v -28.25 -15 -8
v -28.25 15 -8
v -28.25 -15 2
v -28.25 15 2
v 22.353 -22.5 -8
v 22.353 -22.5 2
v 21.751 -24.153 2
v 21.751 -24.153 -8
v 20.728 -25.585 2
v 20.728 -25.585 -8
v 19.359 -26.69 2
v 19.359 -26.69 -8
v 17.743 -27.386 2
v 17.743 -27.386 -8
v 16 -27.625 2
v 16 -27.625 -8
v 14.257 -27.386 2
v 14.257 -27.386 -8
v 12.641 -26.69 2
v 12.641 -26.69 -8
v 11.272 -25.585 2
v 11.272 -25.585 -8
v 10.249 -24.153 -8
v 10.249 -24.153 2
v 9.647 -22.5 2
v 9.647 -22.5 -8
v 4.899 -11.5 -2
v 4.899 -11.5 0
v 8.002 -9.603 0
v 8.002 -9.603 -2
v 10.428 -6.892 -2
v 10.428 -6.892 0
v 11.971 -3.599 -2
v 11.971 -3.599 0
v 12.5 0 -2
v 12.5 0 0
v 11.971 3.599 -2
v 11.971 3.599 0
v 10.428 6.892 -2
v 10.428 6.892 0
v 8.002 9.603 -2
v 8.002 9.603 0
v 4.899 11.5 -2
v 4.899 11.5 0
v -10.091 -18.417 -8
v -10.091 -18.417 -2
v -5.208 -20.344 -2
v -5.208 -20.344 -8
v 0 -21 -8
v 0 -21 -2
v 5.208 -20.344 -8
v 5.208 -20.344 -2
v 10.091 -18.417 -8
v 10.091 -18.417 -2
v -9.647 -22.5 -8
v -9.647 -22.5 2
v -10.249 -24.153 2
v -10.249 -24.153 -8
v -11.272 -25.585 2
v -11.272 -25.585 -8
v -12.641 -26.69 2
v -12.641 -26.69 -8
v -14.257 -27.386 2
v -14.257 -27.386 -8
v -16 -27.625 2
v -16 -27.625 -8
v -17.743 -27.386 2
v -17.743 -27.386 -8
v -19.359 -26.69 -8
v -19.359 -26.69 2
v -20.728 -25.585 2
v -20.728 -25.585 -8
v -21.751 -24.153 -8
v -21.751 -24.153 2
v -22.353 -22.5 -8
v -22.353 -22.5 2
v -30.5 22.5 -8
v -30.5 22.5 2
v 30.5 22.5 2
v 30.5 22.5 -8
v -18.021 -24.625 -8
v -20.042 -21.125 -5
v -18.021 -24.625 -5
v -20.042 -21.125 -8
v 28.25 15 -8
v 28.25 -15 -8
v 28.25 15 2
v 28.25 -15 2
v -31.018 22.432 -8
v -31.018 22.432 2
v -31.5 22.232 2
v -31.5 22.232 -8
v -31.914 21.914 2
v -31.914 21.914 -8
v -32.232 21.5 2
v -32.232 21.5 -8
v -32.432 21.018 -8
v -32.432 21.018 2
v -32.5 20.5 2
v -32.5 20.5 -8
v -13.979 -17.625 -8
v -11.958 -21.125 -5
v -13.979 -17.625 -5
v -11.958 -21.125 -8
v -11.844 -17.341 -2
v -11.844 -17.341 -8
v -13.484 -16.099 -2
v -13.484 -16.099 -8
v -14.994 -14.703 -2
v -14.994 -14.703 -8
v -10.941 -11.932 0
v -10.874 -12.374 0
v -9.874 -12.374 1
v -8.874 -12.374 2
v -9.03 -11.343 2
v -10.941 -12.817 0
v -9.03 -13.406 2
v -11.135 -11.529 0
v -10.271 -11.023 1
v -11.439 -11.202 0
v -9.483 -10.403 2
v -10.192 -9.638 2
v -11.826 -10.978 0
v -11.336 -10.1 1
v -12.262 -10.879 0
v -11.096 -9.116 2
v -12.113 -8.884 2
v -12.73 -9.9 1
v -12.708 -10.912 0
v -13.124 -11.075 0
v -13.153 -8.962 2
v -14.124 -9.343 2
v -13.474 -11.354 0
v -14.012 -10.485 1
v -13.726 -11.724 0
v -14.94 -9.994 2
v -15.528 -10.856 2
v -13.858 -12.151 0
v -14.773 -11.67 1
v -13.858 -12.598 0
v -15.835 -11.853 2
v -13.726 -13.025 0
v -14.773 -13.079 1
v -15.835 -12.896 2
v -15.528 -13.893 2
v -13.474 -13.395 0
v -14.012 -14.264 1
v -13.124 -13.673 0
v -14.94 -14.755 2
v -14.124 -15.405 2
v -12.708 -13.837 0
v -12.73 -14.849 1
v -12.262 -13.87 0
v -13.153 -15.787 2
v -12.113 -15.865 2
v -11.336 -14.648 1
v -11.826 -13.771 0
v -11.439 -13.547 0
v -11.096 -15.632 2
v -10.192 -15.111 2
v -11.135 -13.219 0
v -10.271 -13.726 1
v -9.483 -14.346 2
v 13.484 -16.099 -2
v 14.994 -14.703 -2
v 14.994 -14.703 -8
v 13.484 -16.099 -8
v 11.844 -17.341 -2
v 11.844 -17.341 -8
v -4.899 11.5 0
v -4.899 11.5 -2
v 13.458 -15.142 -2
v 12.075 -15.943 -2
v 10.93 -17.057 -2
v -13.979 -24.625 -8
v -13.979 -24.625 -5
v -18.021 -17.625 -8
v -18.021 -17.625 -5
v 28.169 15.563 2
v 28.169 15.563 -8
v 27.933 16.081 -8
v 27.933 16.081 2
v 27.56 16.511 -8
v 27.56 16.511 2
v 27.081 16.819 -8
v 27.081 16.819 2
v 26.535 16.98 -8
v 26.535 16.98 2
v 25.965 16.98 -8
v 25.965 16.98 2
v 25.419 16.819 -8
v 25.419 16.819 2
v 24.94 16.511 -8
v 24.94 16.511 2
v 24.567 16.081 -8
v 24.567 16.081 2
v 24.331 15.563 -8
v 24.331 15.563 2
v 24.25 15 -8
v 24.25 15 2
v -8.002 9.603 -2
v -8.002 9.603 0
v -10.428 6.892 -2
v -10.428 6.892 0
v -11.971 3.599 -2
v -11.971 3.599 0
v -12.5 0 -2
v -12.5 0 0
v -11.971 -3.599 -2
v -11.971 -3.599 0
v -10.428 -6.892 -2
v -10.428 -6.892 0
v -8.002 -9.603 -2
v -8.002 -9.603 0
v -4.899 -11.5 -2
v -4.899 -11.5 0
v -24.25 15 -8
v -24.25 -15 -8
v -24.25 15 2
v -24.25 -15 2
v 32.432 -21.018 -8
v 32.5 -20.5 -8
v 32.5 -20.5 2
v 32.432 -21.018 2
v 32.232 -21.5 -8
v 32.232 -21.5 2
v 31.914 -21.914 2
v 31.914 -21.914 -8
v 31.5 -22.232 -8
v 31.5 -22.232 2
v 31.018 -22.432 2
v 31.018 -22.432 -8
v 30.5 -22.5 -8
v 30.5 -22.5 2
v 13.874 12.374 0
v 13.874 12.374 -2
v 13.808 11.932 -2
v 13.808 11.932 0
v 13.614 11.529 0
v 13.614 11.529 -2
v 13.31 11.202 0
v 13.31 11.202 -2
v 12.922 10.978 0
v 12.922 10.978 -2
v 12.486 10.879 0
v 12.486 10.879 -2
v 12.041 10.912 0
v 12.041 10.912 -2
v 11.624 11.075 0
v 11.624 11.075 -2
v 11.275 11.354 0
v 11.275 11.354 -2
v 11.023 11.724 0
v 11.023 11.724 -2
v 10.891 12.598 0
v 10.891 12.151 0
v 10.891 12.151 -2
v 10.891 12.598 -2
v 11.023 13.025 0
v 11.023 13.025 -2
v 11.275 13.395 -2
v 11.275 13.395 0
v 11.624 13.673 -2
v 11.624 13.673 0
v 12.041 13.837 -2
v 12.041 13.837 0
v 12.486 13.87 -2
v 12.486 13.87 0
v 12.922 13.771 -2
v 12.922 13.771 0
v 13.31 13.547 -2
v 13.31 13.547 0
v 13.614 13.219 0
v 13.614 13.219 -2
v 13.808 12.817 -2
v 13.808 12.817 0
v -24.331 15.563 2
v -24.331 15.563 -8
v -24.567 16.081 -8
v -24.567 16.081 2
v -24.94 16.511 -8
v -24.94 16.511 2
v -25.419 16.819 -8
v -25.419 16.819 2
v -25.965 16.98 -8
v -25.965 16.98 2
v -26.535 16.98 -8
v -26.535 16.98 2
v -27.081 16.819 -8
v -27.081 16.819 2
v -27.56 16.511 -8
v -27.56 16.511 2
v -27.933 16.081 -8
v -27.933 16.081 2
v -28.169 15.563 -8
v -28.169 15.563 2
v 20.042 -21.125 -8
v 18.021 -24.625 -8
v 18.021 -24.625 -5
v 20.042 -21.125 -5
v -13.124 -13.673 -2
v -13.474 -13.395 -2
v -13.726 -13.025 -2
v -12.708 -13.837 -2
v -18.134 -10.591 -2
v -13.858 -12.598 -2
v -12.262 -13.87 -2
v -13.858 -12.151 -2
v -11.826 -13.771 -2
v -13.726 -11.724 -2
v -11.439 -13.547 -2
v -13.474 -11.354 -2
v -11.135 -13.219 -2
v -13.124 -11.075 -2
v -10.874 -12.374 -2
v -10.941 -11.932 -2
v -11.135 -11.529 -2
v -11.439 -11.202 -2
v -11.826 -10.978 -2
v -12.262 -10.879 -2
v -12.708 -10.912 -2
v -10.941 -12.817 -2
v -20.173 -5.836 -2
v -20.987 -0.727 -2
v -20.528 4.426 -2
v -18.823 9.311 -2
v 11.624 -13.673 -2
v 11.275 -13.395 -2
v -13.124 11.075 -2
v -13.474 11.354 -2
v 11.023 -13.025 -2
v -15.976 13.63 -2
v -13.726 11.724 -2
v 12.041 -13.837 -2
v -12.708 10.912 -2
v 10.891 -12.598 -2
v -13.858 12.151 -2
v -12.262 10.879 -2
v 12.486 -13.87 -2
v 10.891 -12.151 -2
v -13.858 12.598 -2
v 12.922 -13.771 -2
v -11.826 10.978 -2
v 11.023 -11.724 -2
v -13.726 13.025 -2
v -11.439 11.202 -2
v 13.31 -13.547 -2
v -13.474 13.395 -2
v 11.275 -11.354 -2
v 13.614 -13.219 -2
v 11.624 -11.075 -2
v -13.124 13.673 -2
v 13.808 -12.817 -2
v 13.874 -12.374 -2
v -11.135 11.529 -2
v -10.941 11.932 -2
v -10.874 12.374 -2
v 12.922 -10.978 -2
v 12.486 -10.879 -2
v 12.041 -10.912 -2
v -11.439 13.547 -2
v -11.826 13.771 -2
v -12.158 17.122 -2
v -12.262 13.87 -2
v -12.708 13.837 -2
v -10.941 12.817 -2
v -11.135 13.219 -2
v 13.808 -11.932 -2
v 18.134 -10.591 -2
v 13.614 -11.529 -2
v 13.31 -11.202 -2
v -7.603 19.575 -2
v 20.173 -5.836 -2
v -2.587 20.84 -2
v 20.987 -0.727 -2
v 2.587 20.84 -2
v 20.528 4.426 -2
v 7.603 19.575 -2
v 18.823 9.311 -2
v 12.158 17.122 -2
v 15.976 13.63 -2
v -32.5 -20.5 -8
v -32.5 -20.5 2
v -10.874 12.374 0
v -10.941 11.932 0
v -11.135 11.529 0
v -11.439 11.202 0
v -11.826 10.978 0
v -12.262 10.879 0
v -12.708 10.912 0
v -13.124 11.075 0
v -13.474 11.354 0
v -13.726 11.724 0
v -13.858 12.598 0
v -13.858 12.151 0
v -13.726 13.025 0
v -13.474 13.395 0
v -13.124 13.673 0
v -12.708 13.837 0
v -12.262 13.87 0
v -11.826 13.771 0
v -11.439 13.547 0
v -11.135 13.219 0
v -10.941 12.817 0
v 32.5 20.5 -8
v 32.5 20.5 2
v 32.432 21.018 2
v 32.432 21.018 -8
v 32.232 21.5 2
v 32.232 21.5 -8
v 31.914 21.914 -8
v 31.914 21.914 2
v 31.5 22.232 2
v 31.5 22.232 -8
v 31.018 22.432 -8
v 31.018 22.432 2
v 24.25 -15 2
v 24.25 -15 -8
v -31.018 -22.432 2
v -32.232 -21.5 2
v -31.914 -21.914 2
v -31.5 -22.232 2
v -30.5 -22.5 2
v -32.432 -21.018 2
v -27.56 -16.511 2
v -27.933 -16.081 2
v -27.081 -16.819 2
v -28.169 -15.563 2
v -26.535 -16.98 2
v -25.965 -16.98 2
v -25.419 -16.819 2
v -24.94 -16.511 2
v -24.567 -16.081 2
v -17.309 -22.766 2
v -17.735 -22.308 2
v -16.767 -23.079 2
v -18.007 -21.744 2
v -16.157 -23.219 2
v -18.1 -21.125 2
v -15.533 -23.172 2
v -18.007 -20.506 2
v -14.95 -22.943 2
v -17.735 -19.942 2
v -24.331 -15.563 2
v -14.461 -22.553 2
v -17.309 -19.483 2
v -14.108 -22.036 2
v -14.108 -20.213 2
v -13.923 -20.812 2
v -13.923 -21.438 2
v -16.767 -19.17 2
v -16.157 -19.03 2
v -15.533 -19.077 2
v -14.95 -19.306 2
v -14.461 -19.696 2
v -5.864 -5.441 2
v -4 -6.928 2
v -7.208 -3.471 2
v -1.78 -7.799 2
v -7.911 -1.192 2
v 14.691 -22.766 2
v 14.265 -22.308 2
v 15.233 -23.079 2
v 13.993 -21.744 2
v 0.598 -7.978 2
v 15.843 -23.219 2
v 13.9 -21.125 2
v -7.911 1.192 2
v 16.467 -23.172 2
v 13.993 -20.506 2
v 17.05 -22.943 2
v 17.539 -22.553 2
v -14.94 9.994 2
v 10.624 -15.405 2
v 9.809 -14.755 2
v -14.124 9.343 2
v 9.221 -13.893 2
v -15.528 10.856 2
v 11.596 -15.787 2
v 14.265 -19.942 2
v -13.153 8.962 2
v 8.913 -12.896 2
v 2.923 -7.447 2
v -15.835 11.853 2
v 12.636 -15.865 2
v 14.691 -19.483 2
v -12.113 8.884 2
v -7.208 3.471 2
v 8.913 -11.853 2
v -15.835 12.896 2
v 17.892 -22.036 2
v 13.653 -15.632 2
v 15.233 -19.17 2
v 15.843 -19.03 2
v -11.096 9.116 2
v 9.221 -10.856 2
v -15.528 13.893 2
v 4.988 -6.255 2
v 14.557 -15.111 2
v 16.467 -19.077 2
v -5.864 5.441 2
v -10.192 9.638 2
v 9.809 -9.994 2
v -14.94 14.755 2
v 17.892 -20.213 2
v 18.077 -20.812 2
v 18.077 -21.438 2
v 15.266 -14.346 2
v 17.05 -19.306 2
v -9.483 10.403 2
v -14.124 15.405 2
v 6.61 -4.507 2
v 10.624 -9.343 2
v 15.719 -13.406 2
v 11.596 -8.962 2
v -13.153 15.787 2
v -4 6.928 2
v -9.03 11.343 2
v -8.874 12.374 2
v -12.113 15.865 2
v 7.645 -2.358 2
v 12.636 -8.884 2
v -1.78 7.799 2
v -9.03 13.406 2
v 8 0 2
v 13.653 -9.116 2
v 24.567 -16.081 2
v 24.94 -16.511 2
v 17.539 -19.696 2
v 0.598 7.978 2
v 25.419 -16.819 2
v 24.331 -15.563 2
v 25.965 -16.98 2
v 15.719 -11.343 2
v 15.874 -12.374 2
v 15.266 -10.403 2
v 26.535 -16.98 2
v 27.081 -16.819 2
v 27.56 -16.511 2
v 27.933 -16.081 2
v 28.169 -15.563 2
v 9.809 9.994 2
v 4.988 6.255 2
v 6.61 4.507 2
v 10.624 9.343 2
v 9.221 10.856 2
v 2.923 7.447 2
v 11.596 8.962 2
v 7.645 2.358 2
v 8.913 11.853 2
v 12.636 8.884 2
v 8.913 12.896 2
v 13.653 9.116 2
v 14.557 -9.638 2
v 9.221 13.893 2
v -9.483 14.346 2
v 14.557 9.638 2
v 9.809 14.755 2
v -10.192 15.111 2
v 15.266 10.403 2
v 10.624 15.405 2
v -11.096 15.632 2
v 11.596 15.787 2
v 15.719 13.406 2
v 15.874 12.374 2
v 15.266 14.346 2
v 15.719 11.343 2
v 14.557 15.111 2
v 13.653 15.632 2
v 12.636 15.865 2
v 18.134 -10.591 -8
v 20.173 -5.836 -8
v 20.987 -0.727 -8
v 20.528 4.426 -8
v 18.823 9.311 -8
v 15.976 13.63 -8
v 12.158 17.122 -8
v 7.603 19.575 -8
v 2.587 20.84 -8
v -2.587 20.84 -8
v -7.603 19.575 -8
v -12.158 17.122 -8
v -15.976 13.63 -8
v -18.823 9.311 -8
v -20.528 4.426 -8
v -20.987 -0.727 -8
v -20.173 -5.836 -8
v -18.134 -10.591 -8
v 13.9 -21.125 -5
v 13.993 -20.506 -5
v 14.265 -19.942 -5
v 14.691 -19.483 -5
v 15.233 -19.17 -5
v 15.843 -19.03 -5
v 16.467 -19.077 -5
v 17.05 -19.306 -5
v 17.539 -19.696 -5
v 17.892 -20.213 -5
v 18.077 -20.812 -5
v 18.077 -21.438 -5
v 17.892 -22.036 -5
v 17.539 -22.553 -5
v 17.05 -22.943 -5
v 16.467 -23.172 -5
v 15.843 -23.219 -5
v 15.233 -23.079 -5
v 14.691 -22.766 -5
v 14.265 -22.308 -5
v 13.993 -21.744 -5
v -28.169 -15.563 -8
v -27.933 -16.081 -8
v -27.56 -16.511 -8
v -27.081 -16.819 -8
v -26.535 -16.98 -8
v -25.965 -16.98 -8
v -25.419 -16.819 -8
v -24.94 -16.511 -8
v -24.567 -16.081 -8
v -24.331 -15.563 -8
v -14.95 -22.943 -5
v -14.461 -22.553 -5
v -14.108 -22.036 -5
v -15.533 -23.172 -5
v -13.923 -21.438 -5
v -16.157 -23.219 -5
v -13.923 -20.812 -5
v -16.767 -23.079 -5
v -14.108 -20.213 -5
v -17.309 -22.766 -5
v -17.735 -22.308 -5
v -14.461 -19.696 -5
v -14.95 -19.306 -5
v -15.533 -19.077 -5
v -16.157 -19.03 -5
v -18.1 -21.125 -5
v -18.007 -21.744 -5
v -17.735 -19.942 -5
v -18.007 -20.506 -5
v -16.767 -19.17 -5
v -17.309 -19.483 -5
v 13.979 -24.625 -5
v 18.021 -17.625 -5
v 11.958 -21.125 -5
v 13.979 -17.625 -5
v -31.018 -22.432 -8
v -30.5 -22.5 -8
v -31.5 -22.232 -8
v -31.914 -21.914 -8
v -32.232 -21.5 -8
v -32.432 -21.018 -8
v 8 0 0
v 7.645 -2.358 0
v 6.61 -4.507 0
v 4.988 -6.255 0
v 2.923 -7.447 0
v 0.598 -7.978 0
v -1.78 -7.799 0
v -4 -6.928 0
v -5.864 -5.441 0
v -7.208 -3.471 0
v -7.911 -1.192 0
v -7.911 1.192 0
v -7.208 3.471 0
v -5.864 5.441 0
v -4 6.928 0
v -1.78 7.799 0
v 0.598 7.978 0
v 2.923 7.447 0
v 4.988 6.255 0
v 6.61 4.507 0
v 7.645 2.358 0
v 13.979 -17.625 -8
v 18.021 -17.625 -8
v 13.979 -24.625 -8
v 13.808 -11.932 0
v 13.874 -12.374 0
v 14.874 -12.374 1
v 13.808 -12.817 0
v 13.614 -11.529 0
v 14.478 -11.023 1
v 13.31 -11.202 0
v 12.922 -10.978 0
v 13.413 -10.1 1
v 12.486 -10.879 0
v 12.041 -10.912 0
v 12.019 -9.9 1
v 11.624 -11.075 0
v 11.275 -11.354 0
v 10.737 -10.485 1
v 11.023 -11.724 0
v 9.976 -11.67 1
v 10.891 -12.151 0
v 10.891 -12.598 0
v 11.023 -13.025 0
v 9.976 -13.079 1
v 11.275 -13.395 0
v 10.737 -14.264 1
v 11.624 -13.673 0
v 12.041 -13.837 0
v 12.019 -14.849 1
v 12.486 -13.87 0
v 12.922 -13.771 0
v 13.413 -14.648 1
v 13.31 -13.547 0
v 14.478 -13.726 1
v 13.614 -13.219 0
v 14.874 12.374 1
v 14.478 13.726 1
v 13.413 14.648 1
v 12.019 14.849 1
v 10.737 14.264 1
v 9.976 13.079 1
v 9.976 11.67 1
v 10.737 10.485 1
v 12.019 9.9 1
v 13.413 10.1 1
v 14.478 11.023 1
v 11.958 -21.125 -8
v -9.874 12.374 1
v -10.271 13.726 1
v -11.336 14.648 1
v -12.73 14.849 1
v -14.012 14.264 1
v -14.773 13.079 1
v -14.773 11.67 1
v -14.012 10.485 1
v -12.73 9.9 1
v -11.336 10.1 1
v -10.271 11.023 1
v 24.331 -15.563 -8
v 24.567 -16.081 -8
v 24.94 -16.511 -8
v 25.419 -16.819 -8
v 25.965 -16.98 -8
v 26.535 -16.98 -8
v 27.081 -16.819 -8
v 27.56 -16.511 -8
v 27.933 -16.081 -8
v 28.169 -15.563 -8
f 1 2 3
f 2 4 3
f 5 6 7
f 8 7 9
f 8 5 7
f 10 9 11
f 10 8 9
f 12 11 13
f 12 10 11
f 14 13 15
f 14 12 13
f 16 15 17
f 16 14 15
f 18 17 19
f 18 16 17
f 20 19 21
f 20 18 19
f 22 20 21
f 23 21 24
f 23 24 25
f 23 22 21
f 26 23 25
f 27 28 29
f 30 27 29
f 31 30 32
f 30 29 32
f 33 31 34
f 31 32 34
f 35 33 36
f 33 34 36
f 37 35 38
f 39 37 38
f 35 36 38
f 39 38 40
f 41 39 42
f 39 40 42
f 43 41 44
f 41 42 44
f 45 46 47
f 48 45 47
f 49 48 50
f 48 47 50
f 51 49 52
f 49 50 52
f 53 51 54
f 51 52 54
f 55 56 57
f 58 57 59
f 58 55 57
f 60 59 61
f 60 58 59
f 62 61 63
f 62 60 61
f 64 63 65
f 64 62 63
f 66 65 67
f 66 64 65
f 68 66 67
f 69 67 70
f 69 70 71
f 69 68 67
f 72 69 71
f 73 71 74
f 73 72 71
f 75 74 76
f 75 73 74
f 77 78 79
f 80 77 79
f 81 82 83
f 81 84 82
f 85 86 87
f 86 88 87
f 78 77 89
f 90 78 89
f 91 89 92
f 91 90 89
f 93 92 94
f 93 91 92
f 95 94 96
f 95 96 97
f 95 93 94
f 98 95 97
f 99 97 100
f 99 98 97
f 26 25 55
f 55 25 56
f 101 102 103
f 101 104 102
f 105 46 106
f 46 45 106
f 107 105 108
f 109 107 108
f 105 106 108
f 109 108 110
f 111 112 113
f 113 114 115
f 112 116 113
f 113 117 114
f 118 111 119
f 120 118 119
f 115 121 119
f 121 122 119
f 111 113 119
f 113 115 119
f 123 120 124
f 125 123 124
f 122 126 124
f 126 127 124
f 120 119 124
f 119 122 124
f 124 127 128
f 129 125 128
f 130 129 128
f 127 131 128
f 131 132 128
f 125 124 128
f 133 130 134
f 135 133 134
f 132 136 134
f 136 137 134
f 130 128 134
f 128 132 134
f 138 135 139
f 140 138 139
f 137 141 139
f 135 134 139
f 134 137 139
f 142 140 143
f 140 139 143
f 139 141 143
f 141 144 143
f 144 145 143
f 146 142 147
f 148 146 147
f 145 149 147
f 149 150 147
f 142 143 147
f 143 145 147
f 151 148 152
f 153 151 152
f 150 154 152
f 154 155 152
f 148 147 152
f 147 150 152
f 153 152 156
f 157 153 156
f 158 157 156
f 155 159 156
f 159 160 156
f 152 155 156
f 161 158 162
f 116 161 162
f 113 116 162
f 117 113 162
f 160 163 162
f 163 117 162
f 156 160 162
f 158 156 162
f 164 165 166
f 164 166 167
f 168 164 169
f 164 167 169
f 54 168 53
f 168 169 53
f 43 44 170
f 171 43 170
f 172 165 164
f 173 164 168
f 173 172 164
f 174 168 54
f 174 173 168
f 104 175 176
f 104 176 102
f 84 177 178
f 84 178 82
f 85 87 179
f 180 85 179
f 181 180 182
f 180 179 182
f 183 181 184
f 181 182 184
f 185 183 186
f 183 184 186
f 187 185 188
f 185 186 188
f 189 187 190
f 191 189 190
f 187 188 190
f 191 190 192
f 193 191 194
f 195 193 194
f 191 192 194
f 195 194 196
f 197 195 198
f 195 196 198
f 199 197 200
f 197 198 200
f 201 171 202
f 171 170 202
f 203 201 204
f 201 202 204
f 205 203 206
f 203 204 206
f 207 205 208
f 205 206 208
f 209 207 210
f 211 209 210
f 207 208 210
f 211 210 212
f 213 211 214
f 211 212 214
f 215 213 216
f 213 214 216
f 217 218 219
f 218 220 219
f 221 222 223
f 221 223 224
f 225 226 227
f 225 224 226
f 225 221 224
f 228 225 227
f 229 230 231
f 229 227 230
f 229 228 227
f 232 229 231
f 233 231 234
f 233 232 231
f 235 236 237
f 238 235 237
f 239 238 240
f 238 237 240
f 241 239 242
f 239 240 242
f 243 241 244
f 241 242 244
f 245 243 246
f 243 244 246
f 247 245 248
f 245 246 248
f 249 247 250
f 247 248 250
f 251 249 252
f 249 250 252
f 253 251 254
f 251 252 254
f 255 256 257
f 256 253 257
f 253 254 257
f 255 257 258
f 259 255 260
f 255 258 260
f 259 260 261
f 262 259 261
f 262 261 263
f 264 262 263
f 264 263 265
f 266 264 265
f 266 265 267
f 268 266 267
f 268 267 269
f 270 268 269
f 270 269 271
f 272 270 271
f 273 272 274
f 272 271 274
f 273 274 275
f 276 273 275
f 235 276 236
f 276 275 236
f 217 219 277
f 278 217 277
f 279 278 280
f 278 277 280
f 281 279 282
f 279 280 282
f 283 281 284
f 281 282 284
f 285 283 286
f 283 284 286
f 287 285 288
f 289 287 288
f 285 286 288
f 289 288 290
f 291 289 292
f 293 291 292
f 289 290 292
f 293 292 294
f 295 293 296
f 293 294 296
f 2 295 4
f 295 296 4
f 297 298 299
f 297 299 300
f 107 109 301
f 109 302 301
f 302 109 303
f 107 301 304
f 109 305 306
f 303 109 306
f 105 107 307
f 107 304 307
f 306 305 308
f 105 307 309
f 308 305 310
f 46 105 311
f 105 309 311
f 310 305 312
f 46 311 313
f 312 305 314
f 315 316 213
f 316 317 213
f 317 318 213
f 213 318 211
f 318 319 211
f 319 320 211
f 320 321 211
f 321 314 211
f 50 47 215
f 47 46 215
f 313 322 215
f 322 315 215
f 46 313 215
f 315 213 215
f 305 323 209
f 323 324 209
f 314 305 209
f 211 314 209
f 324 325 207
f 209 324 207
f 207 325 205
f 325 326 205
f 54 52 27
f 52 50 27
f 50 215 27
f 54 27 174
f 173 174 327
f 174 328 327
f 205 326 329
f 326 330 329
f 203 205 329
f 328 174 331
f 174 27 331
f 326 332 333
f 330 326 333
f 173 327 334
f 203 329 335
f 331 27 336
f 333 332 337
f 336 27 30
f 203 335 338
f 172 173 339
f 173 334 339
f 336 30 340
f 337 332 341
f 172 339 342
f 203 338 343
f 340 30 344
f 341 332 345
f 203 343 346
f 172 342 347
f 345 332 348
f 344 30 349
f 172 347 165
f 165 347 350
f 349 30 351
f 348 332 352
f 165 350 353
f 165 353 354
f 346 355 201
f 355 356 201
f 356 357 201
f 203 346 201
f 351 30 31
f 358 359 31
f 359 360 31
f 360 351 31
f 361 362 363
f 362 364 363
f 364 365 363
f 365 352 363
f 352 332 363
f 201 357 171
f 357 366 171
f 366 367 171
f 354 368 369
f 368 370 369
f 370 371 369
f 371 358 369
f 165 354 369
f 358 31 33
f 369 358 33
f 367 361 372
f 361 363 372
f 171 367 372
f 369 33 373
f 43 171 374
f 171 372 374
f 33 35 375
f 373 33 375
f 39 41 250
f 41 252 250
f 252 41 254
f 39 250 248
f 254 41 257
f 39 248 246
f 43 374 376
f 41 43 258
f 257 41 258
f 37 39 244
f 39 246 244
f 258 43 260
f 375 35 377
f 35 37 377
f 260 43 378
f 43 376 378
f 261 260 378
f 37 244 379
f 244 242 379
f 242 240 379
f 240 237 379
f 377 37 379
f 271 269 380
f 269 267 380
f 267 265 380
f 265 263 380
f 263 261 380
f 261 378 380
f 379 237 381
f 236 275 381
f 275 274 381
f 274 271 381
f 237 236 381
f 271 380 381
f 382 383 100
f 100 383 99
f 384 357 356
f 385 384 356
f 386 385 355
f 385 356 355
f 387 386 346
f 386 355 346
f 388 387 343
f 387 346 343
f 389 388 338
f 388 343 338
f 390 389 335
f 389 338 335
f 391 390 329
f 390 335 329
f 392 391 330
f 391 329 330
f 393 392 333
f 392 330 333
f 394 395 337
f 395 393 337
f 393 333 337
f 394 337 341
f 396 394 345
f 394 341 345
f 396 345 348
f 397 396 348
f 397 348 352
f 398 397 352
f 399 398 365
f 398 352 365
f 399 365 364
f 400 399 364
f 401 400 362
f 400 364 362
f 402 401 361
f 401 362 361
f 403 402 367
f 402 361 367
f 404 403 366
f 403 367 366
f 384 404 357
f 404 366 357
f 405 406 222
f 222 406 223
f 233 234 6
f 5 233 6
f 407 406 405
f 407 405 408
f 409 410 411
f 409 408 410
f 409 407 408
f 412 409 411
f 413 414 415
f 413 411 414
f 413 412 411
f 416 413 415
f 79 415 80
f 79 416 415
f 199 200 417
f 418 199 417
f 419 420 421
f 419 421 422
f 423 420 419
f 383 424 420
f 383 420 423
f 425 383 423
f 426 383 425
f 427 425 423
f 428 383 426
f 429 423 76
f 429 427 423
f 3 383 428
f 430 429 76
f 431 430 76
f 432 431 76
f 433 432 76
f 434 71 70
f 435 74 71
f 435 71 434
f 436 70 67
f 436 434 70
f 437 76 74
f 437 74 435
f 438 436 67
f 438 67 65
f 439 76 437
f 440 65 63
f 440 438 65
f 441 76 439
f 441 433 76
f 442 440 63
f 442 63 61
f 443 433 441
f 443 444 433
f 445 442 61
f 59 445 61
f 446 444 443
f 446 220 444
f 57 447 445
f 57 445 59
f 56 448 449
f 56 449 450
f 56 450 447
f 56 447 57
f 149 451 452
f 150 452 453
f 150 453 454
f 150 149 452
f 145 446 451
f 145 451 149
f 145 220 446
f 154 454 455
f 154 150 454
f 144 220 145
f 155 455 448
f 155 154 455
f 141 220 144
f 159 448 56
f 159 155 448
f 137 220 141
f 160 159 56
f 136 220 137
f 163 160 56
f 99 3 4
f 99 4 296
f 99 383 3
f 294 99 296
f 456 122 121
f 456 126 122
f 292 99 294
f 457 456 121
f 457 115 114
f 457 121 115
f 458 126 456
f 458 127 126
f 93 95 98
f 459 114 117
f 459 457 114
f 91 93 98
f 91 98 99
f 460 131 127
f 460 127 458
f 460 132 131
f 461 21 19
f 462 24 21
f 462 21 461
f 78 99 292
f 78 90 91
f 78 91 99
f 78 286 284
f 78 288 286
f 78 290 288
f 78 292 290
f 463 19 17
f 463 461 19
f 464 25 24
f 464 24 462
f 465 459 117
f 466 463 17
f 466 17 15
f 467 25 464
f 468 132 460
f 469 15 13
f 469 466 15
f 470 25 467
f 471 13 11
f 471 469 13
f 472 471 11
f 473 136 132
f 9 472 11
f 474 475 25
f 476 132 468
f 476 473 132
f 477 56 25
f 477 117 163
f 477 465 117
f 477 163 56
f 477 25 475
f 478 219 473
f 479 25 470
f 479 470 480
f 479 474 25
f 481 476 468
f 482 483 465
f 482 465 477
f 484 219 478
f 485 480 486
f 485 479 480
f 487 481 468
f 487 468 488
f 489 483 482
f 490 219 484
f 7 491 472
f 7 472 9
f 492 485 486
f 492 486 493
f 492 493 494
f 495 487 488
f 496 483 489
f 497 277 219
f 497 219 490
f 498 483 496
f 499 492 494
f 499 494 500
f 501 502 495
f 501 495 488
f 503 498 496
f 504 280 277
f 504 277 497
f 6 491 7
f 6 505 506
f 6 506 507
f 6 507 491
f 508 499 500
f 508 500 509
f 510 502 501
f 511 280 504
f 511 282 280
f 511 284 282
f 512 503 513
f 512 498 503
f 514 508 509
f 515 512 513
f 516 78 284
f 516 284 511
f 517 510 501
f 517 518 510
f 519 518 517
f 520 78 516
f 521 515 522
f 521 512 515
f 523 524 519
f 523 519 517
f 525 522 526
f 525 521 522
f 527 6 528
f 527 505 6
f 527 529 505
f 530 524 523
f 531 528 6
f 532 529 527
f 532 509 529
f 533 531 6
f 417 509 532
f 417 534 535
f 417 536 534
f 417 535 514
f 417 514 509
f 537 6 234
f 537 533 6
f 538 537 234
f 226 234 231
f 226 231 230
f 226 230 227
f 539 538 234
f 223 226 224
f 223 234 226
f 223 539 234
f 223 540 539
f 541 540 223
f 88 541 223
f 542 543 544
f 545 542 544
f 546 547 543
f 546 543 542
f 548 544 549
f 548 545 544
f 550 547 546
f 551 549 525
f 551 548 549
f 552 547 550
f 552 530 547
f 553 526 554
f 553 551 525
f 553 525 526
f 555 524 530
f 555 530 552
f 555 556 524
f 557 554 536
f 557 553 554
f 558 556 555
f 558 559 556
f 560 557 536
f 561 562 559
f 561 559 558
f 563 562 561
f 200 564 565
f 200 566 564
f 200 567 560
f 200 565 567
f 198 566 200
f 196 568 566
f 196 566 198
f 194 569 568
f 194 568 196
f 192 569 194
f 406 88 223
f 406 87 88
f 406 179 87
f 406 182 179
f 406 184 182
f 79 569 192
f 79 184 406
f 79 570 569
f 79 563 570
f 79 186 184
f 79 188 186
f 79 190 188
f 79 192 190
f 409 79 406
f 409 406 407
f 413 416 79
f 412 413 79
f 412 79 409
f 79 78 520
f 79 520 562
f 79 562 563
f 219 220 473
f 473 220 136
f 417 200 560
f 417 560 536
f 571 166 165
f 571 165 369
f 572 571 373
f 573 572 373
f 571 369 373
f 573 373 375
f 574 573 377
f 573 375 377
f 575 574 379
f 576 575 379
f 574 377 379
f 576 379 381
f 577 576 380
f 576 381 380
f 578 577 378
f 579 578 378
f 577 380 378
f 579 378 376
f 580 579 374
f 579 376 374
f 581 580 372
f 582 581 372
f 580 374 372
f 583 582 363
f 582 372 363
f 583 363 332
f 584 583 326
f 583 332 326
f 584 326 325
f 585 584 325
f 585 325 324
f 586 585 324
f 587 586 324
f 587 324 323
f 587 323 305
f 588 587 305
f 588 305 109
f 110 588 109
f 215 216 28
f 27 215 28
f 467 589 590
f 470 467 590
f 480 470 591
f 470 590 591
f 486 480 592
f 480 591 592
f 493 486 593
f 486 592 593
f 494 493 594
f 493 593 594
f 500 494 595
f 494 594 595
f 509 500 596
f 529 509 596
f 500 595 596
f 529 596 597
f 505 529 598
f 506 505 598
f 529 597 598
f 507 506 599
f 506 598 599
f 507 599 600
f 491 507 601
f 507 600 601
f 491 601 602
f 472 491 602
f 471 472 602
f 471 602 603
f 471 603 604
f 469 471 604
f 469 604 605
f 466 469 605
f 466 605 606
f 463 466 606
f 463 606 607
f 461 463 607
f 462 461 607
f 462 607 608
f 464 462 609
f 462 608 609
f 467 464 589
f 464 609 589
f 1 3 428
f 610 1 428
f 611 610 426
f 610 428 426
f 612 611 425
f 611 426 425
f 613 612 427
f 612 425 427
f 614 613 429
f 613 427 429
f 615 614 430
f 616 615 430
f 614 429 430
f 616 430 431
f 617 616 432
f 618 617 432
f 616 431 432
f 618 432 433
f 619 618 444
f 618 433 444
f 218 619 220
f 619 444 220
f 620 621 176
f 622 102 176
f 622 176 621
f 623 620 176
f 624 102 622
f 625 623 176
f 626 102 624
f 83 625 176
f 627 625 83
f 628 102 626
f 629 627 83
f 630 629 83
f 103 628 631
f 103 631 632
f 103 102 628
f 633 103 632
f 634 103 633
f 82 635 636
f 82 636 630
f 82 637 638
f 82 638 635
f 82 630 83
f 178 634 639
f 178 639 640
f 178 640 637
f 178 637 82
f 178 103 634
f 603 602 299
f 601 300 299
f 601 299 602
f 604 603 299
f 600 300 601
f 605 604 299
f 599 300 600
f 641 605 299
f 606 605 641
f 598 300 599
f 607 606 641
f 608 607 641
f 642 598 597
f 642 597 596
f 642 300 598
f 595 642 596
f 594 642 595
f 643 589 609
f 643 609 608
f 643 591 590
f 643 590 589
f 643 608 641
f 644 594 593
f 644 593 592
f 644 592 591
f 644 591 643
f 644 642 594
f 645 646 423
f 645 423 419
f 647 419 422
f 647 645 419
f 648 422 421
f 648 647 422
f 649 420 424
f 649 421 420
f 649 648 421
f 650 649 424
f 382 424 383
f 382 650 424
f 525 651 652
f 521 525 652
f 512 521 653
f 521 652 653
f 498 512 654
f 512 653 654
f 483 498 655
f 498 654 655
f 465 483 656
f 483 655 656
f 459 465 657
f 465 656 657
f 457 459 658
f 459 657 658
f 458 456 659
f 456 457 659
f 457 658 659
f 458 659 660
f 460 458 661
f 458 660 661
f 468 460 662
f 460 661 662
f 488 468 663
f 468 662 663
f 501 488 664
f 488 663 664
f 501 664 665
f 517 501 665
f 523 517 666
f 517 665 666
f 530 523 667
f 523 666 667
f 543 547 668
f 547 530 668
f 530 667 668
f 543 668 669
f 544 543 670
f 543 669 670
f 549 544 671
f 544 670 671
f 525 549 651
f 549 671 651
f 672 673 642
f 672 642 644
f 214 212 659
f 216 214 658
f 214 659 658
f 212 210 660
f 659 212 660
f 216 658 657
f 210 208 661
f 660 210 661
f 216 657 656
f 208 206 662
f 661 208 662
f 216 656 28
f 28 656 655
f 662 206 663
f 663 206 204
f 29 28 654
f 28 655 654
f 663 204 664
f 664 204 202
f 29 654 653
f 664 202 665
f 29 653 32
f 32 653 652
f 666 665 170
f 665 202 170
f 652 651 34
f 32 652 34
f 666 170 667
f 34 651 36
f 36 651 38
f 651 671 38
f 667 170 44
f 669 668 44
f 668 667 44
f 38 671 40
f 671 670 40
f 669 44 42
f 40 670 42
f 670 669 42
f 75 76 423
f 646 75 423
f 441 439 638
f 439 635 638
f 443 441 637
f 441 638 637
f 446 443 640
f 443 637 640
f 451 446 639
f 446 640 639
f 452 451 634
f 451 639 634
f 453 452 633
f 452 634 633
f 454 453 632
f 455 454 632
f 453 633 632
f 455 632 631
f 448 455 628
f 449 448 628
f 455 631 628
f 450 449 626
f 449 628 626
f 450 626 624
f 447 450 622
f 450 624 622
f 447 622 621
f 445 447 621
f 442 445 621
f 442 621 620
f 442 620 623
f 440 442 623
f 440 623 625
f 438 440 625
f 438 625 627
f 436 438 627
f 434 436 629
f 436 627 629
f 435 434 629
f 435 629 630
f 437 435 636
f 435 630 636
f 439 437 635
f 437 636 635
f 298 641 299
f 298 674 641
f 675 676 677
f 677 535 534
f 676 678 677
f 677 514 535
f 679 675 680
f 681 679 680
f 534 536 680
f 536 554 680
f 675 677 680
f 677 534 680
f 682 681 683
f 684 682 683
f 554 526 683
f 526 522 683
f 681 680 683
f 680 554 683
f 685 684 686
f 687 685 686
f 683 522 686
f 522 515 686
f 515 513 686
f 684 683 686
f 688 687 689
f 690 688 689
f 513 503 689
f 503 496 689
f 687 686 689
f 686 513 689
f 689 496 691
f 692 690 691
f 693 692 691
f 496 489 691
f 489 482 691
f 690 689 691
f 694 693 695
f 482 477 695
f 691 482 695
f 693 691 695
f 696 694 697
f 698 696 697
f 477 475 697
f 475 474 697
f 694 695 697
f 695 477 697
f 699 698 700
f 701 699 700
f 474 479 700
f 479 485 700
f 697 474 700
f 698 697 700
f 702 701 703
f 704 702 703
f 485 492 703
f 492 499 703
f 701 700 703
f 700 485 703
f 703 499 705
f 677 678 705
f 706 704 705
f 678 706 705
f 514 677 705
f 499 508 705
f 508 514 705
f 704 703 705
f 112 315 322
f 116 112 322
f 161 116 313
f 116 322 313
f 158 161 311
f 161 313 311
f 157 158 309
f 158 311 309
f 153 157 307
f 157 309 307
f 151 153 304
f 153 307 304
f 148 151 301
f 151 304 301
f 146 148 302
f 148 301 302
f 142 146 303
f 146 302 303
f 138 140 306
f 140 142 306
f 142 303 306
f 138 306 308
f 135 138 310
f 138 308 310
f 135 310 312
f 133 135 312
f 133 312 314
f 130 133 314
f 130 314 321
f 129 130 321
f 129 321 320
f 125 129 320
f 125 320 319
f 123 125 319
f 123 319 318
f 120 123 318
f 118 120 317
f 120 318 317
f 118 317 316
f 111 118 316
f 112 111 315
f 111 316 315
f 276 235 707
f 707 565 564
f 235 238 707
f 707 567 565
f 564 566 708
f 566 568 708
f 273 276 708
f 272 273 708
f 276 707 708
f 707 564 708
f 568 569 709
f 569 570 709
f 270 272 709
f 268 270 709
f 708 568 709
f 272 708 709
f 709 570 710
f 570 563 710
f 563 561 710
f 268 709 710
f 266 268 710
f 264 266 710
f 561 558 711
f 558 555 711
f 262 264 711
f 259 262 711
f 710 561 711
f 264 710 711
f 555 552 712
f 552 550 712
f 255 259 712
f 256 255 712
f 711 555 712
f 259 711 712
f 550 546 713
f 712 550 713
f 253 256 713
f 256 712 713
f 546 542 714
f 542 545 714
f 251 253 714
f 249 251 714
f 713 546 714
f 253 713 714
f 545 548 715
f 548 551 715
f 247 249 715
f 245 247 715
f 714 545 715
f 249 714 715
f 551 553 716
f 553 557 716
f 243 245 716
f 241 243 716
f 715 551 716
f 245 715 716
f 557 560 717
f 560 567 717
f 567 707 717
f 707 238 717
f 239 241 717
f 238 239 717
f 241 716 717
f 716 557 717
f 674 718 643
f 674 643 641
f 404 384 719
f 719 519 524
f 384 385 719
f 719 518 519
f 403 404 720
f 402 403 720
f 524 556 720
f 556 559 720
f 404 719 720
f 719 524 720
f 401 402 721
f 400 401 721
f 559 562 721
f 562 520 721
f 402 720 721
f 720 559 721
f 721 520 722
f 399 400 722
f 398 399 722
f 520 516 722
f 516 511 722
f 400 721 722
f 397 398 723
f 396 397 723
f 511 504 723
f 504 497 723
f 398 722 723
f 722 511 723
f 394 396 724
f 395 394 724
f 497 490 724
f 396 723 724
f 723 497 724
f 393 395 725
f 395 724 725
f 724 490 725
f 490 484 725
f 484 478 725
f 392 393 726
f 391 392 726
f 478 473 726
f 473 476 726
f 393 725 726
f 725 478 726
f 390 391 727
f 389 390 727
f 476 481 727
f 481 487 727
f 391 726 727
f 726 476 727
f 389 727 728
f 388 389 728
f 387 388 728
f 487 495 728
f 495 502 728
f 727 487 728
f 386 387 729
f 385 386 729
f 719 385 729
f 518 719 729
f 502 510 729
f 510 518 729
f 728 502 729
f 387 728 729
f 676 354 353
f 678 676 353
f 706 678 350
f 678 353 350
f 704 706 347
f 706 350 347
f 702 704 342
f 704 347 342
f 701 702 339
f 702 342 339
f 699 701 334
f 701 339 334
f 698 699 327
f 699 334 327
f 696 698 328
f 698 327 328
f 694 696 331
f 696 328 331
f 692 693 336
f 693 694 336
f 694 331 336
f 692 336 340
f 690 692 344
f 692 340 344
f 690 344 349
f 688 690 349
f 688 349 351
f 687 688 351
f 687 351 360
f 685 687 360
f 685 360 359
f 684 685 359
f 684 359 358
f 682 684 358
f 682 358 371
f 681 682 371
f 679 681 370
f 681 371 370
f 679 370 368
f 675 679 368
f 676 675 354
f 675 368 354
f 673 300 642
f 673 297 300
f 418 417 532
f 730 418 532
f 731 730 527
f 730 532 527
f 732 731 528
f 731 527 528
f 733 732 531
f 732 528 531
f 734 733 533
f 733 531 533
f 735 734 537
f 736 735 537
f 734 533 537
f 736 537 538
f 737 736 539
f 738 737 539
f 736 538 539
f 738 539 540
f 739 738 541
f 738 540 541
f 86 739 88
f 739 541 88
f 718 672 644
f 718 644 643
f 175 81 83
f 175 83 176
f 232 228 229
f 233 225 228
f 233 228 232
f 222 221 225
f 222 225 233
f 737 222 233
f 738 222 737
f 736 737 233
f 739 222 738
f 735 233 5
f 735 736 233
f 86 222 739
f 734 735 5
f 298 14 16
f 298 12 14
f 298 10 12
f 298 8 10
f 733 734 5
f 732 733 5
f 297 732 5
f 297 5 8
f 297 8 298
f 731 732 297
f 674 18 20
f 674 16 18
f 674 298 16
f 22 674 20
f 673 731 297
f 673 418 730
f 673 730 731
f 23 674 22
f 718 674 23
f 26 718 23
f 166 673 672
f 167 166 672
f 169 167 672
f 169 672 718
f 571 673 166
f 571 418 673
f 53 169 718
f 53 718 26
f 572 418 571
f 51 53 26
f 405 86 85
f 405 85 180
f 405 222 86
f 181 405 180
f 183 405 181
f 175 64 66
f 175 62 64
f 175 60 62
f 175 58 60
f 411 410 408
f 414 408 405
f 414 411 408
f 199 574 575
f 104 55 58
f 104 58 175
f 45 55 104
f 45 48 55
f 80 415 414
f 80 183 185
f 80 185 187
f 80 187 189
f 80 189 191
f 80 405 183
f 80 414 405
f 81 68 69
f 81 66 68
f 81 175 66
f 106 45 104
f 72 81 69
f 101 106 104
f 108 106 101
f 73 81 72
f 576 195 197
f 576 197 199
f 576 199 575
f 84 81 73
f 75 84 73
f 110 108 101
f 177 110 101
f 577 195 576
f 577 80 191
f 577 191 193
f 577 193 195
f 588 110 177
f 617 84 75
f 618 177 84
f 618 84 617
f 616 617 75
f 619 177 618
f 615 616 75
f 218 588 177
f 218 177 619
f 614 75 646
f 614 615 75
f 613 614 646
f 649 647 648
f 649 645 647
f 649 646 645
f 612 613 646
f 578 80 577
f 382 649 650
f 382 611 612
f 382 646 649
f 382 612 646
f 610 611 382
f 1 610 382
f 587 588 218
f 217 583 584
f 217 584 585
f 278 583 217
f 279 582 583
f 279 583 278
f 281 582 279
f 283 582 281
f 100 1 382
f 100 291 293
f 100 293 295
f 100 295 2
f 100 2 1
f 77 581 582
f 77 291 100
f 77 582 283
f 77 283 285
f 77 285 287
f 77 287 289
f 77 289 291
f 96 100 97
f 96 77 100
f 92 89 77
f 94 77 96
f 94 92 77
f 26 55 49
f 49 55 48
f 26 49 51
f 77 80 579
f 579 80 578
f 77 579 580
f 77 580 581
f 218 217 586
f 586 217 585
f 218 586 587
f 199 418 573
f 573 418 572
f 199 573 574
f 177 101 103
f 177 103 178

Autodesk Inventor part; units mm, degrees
ref_plane "YZ Plane" through (0, 0, 0) normal (1, 0, 0) x (0, 1, 0)
ref_plane "XZ Plane" through (0, 0, 0) normal (0, 1, 0) x (-1, 0, 0)
ref_plane "XY Plane" through (0, 0, 0) normal (0, 0, 1) x (1, 0, 0)
sketch "Skizze1" plane through (0, 0, 0) normal (0, 0, 1) x (1, 0, 0)
  circle A0 centre (0, 0) radius 4.5 projected
  line L0 (4.899, 11.5) -> (-4.899, 11.5) projected
  arc A1 (-4.899, 11.5) -> (-4.899, -11.5) centre (0, 0) ccw projected
  line L1 (-4.899, -11.5) -> (4.899, -11.5) projected
  arc A2 (4.899, -11.5) -> (4.899, 11.5) centre (0, 0) ccw projected
  arc A3 (4.899, -11.5) -> (4.899, 11.5) centre (0, 0) ccw projected
  arc A4 (-4.899, 11.5) -> (-4.899, -11.5) centre (0, 0) ccw projected
  line L2 (-4.899, -11.5) -> (4.899, -11.5) projected
  line L3 (4.899, 11.5) -> (-4.899, 11.5) projected
  circle A5 centre (0, 0) radius 21 projected
  arc A6 (-21.082, -16.7467) -> (-16.7467, -21.082) centre (0, 0) ccw projected
  line L4 (-16.7467, -21.082) -> (16.7467, -21.082) projected
  arc A7 (16.7467, -21.082) -> (21.082, -16.7467) centre (0, 0) ccw projected
  line L5 (21.082, -16.7467) -> (21.082, 16.7467) projected
  arc A8 (21.082, 16.7467) -> (16.7467, 21.082) centre (0, 0) ccw projected
  line L6 (16.7467, 21.082) -> (-16.7467, 21.082) projected
  arc A9 (-16.7467, 21.082) -> (-21.082, 16.7467) centre (0, 0) ccw projected
  line L7 (-21.082, 16.7467) -> (-21.082, -16.7467) projected
  line L8 (-32.5, -22.5) -> (32.5, -22.5)
  line L9 (32.5, -22.5) -> (32.5, 22.5)
  line L10 (32.5, 22.5) -> (-32.5, 22.5)
  line L11 (-32.5, 22.5) -> (-32.5, -22.5)
  line L12 (-32.5, -22.5) -> (32.5, 22.5) construction
  line L13 (32.5, -22.5) -> (-32.5, 22.5) construction
  arc A10 (-14.4273, -15.2596) -> (14.4273, -15.2596) centre (0, 0) ccw projected
  arc A11 (15.2596, 14.4273) -> (14.4273, 15.2596) centre (15.494, 15.494) ccw projected
  arc A12 (14.4273, -15.2596) -> (15.2596, -14.4273) centre (15.494, -15.494) ccw projected
  arc A13 (-15.2596, -14.4273) -> (-14.4273, -15.2596) centre (-15.494, -15.494) ccw projected
  arc A14 (-14.4273, 15.2596) -> (-15.2596, 14.4273) centre (-15.494, 15.494) ccw projected
  arc A15 (-15.2596, 14.4273) -> (-15.2596, -14.4273) centre (0, 0) ccw projected
  arc A16 (14.4273, 15.2596) -> (-14.4273, 15.2596) centre (0, 0) ccw projected
  arc A17 (15.2596, -14.4273) -> (15.2596, 14.4273) centre (0, 0) ccw projected
  circle A18 centre (12.3744, -12.3744) radius 1.5 projected
  circle A19 centre (12.3744, -12.3744) radius 1.5 projected
  circle A20 centre (-12.3744, -12.3744) radius 1.5 projected
  circle A21 centre (-12.3744, -12.3744) radius 1.5 projected
  circle A22 centre (-12.3744, 12.3744) radius 1.5 projected
  circle A23 centre (-12.3744, 12.3744) radius 1.5 projected
  circle A24 centre (12.3744, 12.3744) radius 1.5 projected
  circle A25 centre (12.3744, 12.3744) radius 1.5 projected
  point P0 (0, 0)
  point P1 (8.8388, 8.8388)
  point P2 (8.8388, -8.8388)
  point P3 (-8.8388, -8.8388)
  point P4 (-8.8388, 8.8388)
  dimension "d0" = 45
  dimension "d1" = 65
extrude "Extrusion1" add sketch "Skizze1" against normal blind 2 contours A5 | A5 A11 | A12 A5 | A5 A14 | A13 A5 | L7 A9 L6 A8 L5 A7 L4 A6 | L11 L10 L9 L8
sketch "Skizze2" plane through (0, 0, 0) normal (0, 0, 1) x (1, 0, 0)
  circle A0 centre (0, 0) radius 8
  arc A1 (-4.899, 11.5) -> (-4.899, -11.5) centre (0, 0) ccw projected
  line L0 (-4.899, 11.5) -> (4.899, 11.5) projected
  arc A2 (4.899, -11.5) -> (4.899, 11.5) centre (0, 0) ccw projected
  line L1 (4.899, -11.5) -> (-4.899, -11.5) projected
  circle A3 centre (12.3744, 12.3744) radius 1.5 projected
  circle A4 centre (-12.3744, 12.3744) radius 1.5 projected
  circle A5 centre (-12.3744, -12.3744) radius 1.5 projected
  circle A6 centre (12.3744, -12.3744) radius 1.5 projected
  line L2 (-32.5, -22.5) -> (32.5, -22.5) projected
  line L3 (32.5, -22.5) -> (32.5, 22.5) projected
  line L4 (32.5, 22.5) -> (-32.5, 22.5) projected
  line L5 (-32.5, 22.5) -> (-32.5, -22.5) projected
  dimension "d31" = 16
extrude "Extrusion2" add sketch "Skizze2" along normal blind 2 contours L0 A2 L1 A1 | L5 L4 L3 L2
sketch "Skizze3" plane through (0, 0, -2) normal (0, 0, -1) x (-1, 0, 0)
  circle A0 centre (0, 0) radius 21 projected
  line L0 (-32.5, -22.5) -> (32.5, -22.5) projected
  line L1 (32.5, -22.5) -> (32.5, 22.5) projected
  line L2 (32.5, 22.5) -> (-32.5, 22.5) projected
  line L3 (-32.5, 22.5) -> (-32.5, -22.5) projected
  arc A1 (4.899, -11.5) -> (4.899, 11.5) centre (0, 0) ccw projected
  line L4 (-4.899, 11.5) -> (4.899, 11.5) projected
  line L5 (4.899, -11.5) -> (-4.899, -11.5) projected
  arc A2 (-4.899, 11.5) -> (-4.899, -11.5) centre (0, 0) ccw projected
  point P0 (0, 0)
extrude "Extrusion3" add sketch "Skizze3" along normal blind 6 contours L3 L2 L1 L0
sketch "Skizze4" plane through (0, 0, 2) normal (0, 0, 1) x (1, 0, 0)
  circle A0 centre (0, 0) radius 8 projected
  line L0 (-26.25, -15) -> (-26.25, 15) construction
  line L1 (-24.25, -15) -> (-24.25, 15)
  line L2 (-28.25, 15) -> (-28.25, -15)
  arc A1 (-28.25, -15) -> (-24.25, -15) centre (-26.25, -15) ccw
  arc A2 (-24.25, 15) -> (-28.25, 15) centre (-26.25, 15) ccw
  line L3 (26.25, -15) -> (26.25, 15) construction
  line L4 (28.25, -15) -> (28.25, 15)
  line L5 (24.25, 15) -> (24.25, -15)
  arc A3 (24.25, -15) -> (28.25, -15) centre (26.25, -15) ccw
  arc A4 (28.25, 15) -> (24.25, 15) centre (26.25, 15) ccw
  line L6 (-26.25, 0) -> (26.25, 0) construction
  dimension "d10" = 4
  dimension "d11" = 30
  dimension "d32" = 52.5
extrude "Extrusion4" cut sketch "Skizze4" against normal through all contours A1 L2 A2 L1 | A3 L5 A4 L4
sketch "Skizze5" plane through (0, 0, -8) normal (0, 0, -1) x (-1, 0, 0)
  circle A0 centre (0, 0) radius 20
  circle A1 centre (-16, -21.1246) radius 6.5
  circle A2 centre (16, -21.1246) radius 6.5
  circle A3 centre (0, 0) radius 21 projected
  line L0 (-32.5, -22.5) -> (32.5, -22.5) projected
  line L1 (32.5, -22.5) -> (32.5, 22.5) projected
  line L2 (32.5, 22.5) -> (-32.5, 22.5) projected
  line L3 (-32.5, 22.5) -> (-32.5, -22.5) projected
  line L4 (-16, -21.1246) -> (16, -21.1246) construction
  line L5 (0, 0) -> (0, -21.1246) construction
  circle A4 centre (-16, -21.1246) radius 2.1
  circle A5 centre (16, -21.1246) radius 2.1
  dimension "d14" = 40
  dimension "d15" = 13
  dimension "d16" = 13
  dimension "d17" = 32
  dimension "d18" = 4.2
  dimension "d19" = 4.2
extrude "Extrusion5" add sketch "Skizze5" against normal up to surface (10 mm away) contours A1 A3 | A2 A3 | A1 L0 A4 A3 | A2 L0 A5 A3 | L0 A4 A1 | L0 A5 A2
extrude "Extrusion6" cut sketch "Skizze5" against normal through all contours A4 L0 | L0 A4 | A5 L0 | L0 A5
sketch "Skizze6" plane through (0, 0, -8) normal (0, 0, -1) x (-1, 0, 0)
  circle A0 centre (-16, -21.1246) radius 2.1 projected
  circle A1 centre (16, -21.1246) radius 2.1 projected
  line L0 (22.3528, -22.5) -> (32.5, -22.5) projected
  line L1 (32.5, -22.5) -> (32.5, 22.5) projected
  line L2 (32.5, 22.5) -> (-32.5, 22.5) projected
  line L3 (-32.5, 22.5) -> (-32.5, -22.5) projected
  arc A2 (-10.091, -18.4166) -> (10.091, -18.4166) centre (0, 0) ccw projected
  line L4 (-20.0415, -21.1246) -> (-18.0207, -17.6246)
  line L5 (-18.0207, -17.6246) -> (-13.9793, -17.6246)
  line L6 (-13.9793, -17.6246) -> (-11.9585, -21.1246)
  line L7 (-11.9585, -21.1246) -> (-13.9793, -24.6246)
  line L8 (-13.9793, -24.6246) -> (-18.0207, -24.6246)
  line L9 (-18.0207, -24.6246) -> (-20.0415, -21.1246)
  line L10 (20.0415, -21.1246) -> (18.0207, -24.6246)
  line L11 (18.0207, -24.6246) -> (13.9793, -24.6246)
  line L12 (13.9793, -24.6246) -> (11.9585, -21.1246)
  line L13 (11.9585, -21.1246) -> (13.9793, -17.6246)
  line L14 (13.9793, -17.6246) -> (18.0207, -17.6246)
  line L15 (18.0207, -17.6246) -> (20.0415, -21.1246)
  line L16 (-32.5, -22.5) -> (32.5, -22.5) projected
  line L17 (-32.5, -22.5) -> (32.5, -22.5) projected
  arc A3 (-10.091, -18.4166) -> (-14.9941, -14.7029) centre (-16, -21.1246) ccw projected
  arc A4 (14.9941, -14.7029) -> (-14.9941, -14.7029) centre (0, 0) ccw projected
  arc A5 (14.9941, -14.7029) -> (10.091, -18.4166) centre (16, -21.1246) ccw projected
  line L18 (-32.5, -22.5) -> (-22.3528, -22.5) projected
  arc A6 (-22.3528, -22.5) -> (-9.6472, -22.5) centre (-16, -21.1246) ccw projected
  line L19 (-9.6472, -22.5) -> (9.6472, -22.5) projected
  arc A7 (9.6472, -22.5) -> (22.3528, -22.5) centre (16, -21.1246) ccw projected
  point P0 (0, 0)
  dimension "d24" = 7
extrude "Extrusion7" cut sketch "Skizze6" against normal blind 3 contours A0 L16 L9 L4 L5 L6 L7 | A0 L16 L7 L8 L9 | L16 A1 L10 L11 L12 | L12 L13 L14 L15 L10 L16 A1
chamfer "Fase1" distance 2 angle 45 4 edges at (-13.8744, 12.3744, 2) (10.8744, 12.3744, 2) (10.8744, -12.3744, 2) (-13.8744, -12.3744, 2)
fillet "Rundung1" radius 2 4 edges at (-32.5, -22.5, -3) (32.5, -22.5, -3) (32.5, 22.5, -3) (-32.5, 22.5, -3)
sketch "Skizze7" plane through (0, 0, -8) normal (0, 0, -1) x (-1, 0, 0)
  arc A0 (32.5, 20.5) -> (30.5, 22.5) centre (30.5, 20.5) ccw projected
  line L0 (30.5, 22.5) -> (-30.5, 22.5) projected
  arc A1 (-30.5, 22.5) -> (-32.5, 20.5) centre (-30.5, 20.5) ccw projected
  line L1 (-32.5, 20.5) -> (-32.5, -20.5) projected
  arc A2 (-32.5, -20.5) -> (-30.5, -22.5) centre (-30.5, -20.5) ccw projected
  line L2 (-30.5, -22.5) -> (-22.3528, -22.5) projected
  arc A3 (-22.3528, -22.5) -> (-9.6472, -22.5) centre (-16, -21.1246) ccw projected
  line L3 (-9.6472, -22.5) -> (9.6472, -22.5) projected
  arc A4 (9.6472, -22.5) -> (22.3528, -22.5) centre (16, -21.1246) ccw projected
  line L4 (22.3528, -22.5) -> (30.5, -22.5) projected
  arc A5 (30.5, -22.5) -> (32.5, -20.5) centre (30.5, -20.5) ccw projected
  line L5 (32.5, -20.5) -> (32.5, 20.5) projected
  arc A6 (-24.25, 15) -> (-28.25, 15) centre (-26.25, 15) ccw projected
  line L6 (-24.25, 15) -> (-24.25, -15) projected
  arc A7 (-28.25, -15) -> (-24.25, -15) centre (-26.25, -15) ccw projected
  line L7 (-28.25, -15) -> (-28.25, 15) projected
  arc A8 (28.25, 15) -> (24.25, 15) centre (26.25, 15) ccw projected
  line L8 (28.25, 15) -> (28.25, -15) projected
  arc A9 (24.25, -15) -> (28.25, -15) centre (26.25, -15) ccw projected
  line L9 (24.25, -15) -> (24.25, 15) projected
  arc A10 (-10.091, -18.4166) -> (10.091, -18.4166) centre (0, 0) ccw projected
  arc A11 (-10.091, -18.4166) -> (-14.9941, -14.7029) centre (-16, -21.1246) ccw projected
  arc A12 (14.9941, -14.7029) -> (-14.9941, -14.7029) centre (0, 0) ccw projected
  arc A13 (14.9941, -14.7029) -> (10.091, -18.4166) centre (16, -21.1246) ccw projected
  line L10 (18.0207, -17.6246) -> (20.0415, -21.1246) projected
  line L11 (20.0415, -21.1246) -> (18.0207, -24.6246) projected
  line L12 (18.0207, -24.6246) -> (13.9793, -24.6246) projected
  line L13 (13.9793, -24.6246) -> (11.9585, -21.1246) projected
  line L14 (11.9585, -21.1246) -> (13.9793, -17.6246) projected
  line L15 (13.9793, -17.6246) -> (18.0207, -17.6246) projected
  line L16 (-18.0207, -24.6246) -> (-20.0415, -21.1246) projected
  line L17 (-20.0415, -21.1246) -> (-18.0207, -17.6246) projected
  line L18 (-18.0207, -17.6246) -> (-13.9793, -17.6246) projected
  line L19 (-13.9793, -17.6246) -> (-11.9585, -21.1246) projected
  line L20 (-11.9585, -21.1246) -> (-13.9793, -24.6246) projected
  line L21 (-13.9793, -24.6246) -> (-18.0207, -24.6246) projected
  circle A14 centre (0, 0) radius 21
  point P0 (0, 0)
extrude "Extrusion8" cut sketch "Skizze7" against normal up to surface (6 mm away) contours A11 A12 A13 A10 | A14 A11 | A13 A14
properties part number "GearedStepper_RotBase" material "ABS-Kunststoff"
